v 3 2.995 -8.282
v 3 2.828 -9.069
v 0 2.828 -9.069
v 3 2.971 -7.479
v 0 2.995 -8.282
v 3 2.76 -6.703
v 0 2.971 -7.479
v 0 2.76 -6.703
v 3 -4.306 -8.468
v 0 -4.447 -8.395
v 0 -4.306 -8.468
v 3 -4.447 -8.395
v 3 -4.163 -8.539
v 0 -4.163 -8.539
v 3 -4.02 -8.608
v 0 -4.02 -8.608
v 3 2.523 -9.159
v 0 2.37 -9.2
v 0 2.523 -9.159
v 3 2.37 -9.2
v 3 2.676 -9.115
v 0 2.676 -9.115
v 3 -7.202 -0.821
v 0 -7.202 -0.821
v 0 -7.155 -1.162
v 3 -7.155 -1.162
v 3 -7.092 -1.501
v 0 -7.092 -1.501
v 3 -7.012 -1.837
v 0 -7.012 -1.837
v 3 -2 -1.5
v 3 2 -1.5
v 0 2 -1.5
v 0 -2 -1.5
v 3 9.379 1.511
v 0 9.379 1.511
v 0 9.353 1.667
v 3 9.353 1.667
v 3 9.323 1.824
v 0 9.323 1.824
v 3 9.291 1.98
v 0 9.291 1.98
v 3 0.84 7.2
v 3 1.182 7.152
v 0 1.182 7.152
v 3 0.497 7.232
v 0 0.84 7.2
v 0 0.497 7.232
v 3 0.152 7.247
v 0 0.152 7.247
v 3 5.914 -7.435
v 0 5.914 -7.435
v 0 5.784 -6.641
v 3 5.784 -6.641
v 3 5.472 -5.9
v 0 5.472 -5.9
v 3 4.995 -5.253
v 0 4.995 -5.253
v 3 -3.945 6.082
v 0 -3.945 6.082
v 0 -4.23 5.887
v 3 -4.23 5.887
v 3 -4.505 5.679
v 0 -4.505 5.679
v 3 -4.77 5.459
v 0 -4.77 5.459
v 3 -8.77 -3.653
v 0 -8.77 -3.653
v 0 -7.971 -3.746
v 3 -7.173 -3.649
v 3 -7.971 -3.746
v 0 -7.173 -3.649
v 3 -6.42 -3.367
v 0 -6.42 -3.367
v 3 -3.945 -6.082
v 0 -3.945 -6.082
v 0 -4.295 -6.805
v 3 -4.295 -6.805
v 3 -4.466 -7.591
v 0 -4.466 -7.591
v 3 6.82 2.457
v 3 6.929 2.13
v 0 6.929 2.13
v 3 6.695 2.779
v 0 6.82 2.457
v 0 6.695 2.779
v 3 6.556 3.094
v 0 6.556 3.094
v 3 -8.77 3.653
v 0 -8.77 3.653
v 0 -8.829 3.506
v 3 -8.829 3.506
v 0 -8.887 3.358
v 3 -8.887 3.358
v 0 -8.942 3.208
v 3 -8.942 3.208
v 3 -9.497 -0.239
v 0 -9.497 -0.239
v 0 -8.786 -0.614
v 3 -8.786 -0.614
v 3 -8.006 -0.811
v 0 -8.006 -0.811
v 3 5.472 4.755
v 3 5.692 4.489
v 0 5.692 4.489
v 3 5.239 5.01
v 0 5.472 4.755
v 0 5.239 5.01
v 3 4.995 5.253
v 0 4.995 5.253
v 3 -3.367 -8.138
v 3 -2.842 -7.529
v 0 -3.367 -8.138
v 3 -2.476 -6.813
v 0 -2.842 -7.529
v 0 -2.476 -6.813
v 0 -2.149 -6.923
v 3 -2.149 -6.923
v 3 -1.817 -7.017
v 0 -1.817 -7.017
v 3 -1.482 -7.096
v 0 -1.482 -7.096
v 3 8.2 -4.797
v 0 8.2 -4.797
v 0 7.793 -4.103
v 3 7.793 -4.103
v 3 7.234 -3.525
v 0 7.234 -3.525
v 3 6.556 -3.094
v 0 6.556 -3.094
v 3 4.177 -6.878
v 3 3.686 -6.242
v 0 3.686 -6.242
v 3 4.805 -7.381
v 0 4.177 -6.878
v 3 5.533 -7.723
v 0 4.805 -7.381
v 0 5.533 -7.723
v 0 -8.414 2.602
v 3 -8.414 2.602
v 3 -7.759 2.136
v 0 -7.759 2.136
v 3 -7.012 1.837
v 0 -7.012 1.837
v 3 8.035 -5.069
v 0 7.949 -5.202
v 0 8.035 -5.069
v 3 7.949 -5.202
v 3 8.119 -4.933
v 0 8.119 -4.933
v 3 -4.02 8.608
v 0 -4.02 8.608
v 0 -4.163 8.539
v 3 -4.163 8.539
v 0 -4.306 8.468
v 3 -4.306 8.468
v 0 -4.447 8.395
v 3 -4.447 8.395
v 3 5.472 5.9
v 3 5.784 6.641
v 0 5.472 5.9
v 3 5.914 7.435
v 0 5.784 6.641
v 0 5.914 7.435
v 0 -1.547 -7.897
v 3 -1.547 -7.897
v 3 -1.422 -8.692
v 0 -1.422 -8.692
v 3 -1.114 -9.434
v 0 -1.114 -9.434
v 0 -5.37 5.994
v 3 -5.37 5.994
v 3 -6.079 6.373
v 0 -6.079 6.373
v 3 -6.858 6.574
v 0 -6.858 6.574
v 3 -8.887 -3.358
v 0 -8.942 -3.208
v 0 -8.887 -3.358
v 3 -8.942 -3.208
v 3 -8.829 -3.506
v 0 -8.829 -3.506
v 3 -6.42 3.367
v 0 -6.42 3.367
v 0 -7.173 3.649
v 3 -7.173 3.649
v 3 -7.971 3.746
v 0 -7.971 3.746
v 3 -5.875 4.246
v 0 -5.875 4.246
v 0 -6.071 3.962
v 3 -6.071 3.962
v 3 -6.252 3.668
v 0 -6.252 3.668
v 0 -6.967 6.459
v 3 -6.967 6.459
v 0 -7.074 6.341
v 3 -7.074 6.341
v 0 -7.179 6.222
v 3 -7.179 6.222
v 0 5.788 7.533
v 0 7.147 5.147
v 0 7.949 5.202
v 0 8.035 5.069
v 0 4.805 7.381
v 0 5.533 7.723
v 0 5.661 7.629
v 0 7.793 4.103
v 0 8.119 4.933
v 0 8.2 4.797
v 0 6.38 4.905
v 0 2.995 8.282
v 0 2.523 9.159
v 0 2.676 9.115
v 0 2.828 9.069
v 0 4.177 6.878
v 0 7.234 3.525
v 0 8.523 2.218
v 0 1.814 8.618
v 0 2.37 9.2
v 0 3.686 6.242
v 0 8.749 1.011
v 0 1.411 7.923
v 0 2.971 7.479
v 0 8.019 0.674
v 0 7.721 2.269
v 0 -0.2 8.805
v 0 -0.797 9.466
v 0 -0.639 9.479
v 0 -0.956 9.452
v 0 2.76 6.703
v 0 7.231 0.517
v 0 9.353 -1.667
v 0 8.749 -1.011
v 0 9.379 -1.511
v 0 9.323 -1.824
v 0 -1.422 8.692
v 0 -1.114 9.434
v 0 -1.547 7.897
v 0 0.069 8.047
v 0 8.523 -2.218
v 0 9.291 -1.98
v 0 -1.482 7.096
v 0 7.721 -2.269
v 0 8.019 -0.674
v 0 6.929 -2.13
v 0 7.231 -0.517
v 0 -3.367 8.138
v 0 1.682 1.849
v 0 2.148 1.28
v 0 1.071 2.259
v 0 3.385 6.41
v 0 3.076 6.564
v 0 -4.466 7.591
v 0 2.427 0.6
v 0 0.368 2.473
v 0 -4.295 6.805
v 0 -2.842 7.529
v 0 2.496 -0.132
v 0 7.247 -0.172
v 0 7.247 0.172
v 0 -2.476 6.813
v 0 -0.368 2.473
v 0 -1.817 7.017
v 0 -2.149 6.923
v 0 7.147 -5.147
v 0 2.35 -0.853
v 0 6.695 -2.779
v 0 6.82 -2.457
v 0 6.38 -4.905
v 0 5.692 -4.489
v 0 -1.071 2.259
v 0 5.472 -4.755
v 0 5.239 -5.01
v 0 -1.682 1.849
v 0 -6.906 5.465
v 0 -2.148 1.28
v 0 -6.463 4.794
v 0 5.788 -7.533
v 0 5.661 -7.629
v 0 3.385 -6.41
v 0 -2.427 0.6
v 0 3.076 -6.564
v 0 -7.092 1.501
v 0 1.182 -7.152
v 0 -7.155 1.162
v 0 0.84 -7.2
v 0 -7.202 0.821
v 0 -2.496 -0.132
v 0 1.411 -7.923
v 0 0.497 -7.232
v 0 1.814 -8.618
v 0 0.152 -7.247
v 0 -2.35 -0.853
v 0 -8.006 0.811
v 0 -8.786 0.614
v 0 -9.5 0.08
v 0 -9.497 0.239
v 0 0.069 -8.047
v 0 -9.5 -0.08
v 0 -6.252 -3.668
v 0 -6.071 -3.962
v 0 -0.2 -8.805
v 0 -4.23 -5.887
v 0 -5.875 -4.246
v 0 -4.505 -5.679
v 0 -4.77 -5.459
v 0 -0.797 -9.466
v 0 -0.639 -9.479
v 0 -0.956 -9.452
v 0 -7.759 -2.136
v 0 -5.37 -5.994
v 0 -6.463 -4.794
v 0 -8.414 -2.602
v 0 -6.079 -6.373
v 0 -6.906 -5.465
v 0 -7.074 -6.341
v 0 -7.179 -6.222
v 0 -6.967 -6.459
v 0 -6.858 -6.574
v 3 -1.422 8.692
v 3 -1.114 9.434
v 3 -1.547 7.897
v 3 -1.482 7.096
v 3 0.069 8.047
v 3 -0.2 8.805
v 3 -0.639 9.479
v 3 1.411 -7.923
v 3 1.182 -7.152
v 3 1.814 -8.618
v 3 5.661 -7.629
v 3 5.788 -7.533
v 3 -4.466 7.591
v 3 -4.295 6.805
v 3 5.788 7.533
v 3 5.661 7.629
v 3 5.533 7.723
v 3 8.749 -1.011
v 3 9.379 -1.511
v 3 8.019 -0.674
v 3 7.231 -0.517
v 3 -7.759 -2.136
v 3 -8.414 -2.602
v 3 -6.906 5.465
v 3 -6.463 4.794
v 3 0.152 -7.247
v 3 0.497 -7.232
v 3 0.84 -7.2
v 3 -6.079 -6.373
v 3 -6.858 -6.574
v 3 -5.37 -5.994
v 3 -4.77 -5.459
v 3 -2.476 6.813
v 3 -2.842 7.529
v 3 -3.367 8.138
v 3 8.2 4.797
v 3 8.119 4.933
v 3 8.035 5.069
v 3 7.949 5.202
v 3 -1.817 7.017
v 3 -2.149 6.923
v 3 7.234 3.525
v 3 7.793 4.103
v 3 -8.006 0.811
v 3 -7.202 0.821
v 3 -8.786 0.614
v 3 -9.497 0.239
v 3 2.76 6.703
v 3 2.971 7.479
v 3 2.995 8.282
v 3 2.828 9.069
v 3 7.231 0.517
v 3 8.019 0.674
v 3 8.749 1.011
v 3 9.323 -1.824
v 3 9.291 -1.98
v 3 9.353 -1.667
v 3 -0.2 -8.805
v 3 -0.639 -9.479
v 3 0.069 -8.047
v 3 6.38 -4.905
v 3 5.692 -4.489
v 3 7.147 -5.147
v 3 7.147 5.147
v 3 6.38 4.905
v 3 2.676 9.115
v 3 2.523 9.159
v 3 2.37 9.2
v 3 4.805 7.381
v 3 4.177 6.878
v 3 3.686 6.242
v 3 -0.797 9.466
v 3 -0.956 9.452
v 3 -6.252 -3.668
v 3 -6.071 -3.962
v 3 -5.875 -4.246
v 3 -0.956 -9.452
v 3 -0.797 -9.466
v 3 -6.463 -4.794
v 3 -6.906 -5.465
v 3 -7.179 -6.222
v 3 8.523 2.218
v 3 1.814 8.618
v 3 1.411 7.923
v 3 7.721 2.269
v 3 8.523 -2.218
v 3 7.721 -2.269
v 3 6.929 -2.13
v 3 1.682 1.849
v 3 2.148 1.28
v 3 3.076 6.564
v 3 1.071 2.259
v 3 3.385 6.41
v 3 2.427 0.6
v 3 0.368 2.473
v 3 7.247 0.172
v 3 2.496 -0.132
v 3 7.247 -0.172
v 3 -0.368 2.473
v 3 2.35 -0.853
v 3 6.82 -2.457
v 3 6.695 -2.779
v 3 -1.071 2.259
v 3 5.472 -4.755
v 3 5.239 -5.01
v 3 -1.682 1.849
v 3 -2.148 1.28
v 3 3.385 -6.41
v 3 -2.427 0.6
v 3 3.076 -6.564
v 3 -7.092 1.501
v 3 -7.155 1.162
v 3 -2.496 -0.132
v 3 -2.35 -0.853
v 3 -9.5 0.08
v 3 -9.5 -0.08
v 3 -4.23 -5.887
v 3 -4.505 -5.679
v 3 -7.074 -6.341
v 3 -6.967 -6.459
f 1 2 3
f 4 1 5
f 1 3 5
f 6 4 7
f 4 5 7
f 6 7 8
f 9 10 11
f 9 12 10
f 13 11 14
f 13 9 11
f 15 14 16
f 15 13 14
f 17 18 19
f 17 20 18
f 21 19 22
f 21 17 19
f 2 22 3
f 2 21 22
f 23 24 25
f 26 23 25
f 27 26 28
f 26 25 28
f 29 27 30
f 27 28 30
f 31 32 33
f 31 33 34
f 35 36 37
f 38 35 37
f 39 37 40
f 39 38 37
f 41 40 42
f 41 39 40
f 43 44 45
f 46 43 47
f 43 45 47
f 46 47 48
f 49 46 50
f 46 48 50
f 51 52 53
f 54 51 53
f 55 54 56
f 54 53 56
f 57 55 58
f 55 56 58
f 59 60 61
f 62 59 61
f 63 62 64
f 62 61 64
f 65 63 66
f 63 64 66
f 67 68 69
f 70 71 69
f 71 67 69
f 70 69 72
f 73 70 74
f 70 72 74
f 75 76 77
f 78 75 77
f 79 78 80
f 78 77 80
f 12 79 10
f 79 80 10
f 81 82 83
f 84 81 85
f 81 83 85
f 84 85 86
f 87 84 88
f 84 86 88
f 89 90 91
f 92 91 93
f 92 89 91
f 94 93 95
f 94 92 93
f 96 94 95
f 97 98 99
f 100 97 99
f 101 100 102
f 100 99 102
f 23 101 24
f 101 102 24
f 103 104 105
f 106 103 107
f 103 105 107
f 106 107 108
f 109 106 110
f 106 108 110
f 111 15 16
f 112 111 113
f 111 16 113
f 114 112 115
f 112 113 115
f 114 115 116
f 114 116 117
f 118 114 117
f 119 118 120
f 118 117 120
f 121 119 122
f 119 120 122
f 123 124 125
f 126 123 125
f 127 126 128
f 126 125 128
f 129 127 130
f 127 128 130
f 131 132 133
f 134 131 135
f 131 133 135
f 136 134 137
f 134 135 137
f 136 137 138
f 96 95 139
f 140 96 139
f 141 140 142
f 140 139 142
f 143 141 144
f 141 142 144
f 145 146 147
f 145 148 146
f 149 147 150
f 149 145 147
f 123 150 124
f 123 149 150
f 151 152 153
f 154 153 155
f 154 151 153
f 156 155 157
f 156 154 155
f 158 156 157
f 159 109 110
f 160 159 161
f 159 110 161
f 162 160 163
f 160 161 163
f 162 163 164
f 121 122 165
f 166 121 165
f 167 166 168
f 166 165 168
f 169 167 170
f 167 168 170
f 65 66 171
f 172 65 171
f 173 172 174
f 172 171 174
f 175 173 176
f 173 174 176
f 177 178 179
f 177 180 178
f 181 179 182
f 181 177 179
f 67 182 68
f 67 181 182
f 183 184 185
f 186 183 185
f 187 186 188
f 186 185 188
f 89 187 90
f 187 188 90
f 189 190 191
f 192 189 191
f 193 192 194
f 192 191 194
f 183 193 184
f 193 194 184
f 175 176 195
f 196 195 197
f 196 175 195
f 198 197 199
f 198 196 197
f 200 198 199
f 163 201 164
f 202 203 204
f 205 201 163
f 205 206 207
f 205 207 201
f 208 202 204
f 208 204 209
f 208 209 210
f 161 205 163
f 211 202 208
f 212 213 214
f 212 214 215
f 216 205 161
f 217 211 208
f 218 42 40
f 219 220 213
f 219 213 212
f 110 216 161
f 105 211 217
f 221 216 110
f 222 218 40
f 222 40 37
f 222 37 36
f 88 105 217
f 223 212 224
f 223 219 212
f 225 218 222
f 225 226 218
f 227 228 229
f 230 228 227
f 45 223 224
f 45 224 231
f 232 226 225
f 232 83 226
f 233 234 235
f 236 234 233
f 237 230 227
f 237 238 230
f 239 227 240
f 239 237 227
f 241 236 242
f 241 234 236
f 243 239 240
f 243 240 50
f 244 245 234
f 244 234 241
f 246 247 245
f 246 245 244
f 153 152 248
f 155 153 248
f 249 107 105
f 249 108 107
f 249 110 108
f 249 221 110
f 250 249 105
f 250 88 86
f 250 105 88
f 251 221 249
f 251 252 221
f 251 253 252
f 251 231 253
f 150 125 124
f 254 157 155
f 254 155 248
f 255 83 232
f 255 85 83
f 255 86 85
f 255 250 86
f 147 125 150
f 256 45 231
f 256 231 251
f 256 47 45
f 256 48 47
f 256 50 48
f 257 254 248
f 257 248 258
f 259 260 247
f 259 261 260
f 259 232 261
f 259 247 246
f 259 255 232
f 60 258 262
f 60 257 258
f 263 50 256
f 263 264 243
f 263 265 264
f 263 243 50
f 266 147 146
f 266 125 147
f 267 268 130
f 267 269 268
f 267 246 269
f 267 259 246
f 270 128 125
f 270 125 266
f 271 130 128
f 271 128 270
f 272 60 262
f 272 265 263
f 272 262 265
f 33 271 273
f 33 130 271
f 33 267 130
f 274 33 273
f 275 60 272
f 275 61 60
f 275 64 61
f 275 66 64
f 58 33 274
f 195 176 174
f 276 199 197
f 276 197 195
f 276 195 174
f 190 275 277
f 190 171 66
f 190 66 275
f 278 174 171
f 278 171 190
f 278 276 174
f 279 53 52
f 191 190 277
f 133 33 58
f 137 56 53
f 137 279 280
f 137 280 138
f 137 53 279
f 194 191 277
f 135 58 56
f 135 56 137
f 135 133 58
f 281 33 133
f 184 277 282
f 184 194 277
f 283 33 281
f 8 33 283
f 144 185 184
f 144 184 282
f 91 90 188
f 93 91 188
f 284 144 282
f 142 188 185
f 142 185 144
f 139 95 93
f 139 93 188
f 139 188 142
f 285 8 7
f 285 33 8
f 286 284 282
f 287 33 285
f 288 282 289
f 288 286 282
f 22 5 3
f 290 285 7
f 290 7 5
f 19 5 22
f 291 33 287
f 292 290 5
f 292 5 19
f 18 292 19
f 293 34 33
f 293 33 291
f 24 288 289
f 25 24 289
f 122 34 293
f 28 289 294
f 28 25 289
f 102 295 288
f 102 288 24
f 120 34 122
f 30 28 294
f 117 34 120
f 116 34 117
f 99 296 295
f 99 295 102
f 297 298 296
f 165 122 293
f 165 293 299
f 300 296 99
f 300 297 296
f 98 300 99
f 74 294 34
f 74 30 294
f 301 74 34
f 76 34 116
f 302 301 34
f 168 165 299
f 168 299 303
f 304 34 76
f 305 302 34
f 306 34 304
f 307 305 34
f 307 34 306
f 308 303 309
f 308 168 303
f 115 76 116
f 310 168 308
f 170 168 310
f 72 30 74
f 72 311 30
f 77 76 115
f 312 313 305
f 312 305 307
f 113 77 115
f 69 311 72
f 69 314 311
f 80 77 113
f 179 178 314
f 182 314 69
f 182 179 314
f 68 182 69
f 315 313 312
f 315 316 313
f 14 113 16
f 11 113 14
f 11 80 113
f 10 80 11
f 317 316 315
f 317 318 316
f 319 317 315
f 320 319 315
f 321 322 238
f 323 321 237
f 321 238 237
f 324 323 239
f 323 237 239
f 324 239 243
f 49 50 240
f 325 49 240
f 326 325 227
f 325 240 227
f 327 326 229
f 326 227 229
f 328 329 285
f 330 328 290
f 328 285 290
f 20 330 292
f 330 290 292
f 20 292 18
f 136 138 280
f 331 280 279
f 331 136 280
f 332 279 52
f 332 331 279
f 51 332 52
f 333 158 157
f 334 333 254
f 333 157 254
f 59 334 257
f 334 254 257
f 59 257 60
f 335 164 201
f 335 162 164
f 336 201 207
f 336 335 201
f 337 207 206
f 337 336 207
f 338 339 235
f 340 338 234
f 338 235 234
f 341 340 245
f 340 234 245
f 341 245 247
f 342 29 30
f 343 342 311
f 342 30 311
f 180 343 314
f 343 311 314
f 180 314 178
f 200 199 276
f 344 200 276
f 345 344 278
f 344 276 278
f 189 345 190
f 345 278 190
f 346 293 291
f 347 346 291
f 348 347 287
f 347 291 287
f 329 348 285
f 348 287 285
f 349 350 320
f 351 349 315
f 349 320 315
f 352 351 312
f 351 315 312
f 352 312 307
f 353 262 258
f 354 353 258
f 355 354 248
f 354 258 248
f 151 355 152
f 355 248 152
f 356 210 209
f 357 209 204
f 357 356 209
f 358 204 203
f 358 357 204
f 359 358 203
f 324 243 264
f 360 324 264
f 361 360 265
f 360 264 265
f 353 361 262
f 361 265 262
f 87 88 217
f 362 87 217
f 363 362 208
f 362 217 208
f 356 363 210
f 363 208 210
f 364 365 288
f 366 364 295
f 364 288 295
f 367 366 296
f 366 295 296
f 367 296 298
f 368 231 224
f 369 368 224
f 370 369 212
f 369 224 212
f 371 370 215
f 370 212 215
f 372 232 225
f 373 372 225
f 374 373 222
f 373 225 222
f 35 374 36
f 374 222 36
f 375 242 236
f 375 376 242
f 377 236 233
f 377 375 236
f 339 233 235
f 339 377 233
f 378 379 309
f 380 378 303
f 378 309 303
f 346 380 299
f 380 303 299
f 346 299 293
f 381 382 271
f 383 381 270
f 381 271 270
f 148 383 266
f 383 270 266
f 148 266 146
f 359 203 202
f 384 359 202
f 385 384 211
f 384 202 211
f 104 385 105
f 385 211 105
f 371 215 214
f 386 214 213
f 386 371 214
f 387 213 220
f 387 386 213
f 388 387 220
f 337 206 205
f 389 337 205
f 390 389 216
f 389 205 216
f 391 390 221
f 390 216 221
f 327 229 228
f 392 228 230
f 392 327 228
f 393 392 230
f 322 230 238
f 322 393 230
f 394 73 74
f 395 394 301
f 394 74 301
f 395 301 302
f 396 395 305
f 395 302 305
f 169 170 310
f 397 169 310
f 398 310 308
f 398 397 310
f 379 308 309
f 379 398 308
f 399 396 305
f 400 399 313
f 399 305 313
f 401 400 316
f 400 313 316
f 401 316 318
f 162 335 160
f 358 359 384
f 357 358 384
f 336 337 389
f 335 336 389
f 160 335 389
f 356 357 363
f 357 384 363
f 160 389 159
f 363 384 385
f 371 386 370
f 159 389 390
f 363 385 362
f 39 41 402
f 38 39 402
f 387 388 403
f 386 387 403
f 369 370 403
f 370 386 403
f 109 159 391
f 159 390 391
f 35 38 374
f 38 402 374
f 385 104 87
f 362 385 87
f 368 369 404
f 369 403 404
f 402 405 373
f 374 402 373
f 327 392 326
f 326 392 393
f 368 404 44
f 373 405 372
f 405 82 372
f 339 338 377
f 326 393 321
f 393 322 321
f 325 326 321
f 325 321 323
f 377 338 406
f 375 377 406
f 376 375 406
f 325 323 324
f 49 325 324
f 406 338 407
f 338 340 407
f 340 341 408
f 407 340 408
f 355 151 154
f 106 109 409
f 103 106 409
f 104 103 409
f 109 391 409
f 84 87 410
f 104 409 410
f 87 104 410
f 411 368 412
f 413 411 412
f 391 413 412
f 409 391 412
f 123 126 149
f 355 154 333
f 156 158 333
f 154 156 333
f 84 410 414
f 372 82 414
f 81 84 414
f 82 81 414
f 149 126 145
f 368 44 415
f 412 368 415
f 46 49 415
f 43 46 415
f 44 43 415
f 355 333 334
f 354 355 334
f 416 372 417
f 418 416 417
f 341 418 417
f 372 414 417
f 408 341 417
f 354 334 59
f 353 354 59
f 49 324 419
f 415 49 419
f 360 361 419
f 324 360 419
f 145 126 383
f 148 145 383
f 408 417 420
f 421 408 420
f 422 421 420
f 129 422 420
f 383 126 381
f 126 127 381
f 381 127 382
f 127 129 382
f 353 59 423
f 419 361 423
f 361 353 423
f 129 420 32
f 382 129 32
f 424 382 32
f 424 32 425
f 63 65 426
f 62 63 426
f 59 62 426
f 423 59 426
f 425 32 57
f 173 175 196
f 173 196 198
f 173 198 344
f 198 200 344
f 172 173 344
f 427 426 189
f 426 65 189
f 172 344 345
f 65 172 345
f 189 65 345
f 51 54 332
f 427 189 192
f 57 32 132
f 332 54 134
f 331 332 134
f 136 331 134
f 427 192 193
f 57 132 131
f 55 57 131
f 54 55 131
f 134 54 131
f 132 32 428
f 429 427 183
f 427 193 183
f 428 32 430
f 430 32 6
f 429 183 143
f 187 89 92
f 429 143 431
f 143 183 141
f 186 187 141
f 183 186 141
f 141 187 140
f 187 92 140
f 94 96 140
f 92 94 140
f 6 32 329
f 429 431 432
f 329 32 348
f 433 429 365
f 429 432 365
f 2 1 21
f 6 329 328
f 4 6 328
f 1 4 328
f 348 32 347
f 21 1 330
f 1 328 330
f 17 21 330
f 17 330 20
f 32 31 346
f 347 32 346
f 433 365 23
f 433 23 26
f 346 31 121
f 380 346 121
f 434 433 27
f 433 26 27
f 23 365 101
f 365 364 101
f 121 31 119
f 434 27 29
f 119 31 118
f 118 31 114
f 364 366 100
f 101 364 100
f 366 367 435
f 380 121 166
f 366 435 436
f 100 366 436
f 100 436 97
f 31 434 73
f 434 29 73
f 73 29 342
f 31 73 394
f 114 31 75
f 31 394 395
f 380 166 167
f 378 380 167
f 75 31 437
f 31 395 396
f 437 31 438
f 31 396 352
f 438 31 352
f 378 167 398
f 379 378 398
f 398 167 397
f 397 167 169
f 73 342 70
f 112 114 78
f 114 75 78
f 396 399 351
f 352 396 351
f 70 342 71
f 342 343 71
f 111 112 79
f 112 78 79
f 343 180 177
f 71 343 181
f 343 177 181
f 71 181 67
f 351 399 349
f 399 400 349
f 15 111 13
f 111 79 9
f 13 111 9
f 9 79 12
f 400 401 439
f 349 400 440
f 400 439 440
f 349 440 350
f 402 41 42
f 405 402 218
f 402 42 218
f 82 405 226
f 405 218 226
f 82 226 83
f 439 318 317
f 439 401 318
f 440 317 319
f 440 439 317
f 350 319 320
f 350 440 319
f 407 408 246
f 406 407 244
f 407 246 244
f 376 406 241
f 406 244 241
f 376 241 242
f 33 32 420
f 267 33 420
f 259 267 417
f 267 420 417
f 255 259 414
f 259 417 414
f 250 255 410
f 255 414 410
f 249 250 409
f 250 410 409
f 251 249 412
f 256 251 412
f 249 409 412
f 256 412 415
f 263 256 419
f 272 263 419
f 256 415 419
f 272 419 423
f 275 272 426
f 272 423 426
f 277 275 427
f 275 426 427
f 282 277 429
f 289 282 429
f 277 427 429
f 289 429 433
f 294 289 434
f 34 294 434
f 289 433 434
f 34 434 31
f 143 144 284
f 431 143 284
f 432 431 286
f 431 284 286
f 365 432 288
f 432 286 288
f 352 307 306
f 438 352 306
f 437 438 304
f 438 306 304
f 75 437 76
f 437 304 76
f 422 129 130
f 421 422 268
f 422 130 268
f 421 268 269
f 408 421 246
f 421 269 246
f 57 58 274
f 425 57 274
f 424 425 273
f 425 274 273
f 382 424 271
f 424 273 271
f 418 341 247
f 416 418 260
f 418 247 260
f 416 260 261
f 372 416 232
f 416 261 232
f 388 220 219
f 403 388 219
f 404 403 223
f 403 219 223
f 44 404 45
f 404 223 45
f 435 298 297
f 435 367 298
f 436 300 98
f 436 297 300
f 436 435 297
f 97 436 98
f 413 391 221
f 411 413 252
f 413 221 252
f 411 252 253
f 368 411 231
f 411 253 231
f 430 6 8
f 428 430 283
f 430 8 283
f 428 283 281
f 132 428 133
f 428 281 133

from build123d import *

# Parameters (mm, degrees)
BASPROSKE_W     = 3
BASPROSKE_H     = 9.5
TOOTHCUT_DEPTH  = 14.765899898
TEETHCUTS_COUNT = 17
TEETHCUTS_ANGLE = 338.823529412
BORSKE_R        = 2.5
BORE_DEPTH      = 50.0000508
EXTRUDE_1_DEPTH = 3


with BuildPart() as part:
    # BasProSke → Base-Revolve (revolve)
    with BuildSketch(Plane(origin=(0, 0, 0), x_dir=(1, 0, 0), z_dir=(0, 1, 0)), mode=Mode.PRIVATE) as base_revolve_sk:
        with Locations((1.5, 4.75)):
            Rectangle(BASPROSKE_W, BASPROSKE_H)
    revolve(base_revolve_sk.sketch.rotate(Axis((-10, 0, 0), (1, 0, 0)), 180), axis=Axis((-10, 0, 0), (1, 0, 0)))

    # TooCutSke → ToothCut (cut, through all)
    with BuildSketch(Plane(origin=(0, 0, 0), x_dir=(0, 0, -1), z_dir=(1, 0, 0))):
        with BuildLine():
            ThreePointArc((0.516861231, 7.23055015), (0, 7.249), (-0.516861231, 7.23055015))
            ThreePointArc((-0.516861231, 7.23055015), (-0.827352654, 8.408398361), (-1.533069197, 9.401220346))
            ThreePointArc((-1.533069197, 9.401220346), (0, 9.5254), (1.533069197, 9.401220346))
            ThreePointArc((1.533069197, 9.401220346), (0.827352654, 8.408398361), (0.516861231, 7.23055015))
        make_face()
    toothcut = extrude(amount=TOOTHCUT_DEPTH, mode=Mode.SUBTRACT)

    # TeethCuts: ToothCut ×17 about axis
    teethcuts_axis = Axis((-10, 0, 0), (1, 0, 0))
    for i in range(1, TEETHCUTS_COUNT):
        add(toothcut.rotate(teethcuts_axis, i * TEETHCUTS_ANGLE / (TEETHCUTS_COUNT - 1)), mode=Mode.SUBTRACT)

    # BorSke → Bore (cut, symmetric)
    with BuildSketch(Plane(origin=(0, 0, 0), x_dir=(0, 0, -1), z_dir=(1, 0, 0))):
        with Locations(Location((0, 0, 0), (0, 0, 180))):
            Circle(BORSKE_R)
    extrude(amount=BORE_DEPTH, both=True, mode=Mode.SUBTRACT)

    # 草图1 → 凸台-拉伸1 (add)
    with BuildSketch(Plane(origin=(3, 0, 0), x_dir=(0, 0, -1), z_dir=(1, 0, 0))):
        with BuildLine():
            Line((1.5, 2), (1.5, -2))
            ThreePointArc((1.5, -2), (2.5, 0), (1.5, 2))
        make_face()
    extrude(amount=-EXTRUDE_1_DEPTH)


solid = part.part
